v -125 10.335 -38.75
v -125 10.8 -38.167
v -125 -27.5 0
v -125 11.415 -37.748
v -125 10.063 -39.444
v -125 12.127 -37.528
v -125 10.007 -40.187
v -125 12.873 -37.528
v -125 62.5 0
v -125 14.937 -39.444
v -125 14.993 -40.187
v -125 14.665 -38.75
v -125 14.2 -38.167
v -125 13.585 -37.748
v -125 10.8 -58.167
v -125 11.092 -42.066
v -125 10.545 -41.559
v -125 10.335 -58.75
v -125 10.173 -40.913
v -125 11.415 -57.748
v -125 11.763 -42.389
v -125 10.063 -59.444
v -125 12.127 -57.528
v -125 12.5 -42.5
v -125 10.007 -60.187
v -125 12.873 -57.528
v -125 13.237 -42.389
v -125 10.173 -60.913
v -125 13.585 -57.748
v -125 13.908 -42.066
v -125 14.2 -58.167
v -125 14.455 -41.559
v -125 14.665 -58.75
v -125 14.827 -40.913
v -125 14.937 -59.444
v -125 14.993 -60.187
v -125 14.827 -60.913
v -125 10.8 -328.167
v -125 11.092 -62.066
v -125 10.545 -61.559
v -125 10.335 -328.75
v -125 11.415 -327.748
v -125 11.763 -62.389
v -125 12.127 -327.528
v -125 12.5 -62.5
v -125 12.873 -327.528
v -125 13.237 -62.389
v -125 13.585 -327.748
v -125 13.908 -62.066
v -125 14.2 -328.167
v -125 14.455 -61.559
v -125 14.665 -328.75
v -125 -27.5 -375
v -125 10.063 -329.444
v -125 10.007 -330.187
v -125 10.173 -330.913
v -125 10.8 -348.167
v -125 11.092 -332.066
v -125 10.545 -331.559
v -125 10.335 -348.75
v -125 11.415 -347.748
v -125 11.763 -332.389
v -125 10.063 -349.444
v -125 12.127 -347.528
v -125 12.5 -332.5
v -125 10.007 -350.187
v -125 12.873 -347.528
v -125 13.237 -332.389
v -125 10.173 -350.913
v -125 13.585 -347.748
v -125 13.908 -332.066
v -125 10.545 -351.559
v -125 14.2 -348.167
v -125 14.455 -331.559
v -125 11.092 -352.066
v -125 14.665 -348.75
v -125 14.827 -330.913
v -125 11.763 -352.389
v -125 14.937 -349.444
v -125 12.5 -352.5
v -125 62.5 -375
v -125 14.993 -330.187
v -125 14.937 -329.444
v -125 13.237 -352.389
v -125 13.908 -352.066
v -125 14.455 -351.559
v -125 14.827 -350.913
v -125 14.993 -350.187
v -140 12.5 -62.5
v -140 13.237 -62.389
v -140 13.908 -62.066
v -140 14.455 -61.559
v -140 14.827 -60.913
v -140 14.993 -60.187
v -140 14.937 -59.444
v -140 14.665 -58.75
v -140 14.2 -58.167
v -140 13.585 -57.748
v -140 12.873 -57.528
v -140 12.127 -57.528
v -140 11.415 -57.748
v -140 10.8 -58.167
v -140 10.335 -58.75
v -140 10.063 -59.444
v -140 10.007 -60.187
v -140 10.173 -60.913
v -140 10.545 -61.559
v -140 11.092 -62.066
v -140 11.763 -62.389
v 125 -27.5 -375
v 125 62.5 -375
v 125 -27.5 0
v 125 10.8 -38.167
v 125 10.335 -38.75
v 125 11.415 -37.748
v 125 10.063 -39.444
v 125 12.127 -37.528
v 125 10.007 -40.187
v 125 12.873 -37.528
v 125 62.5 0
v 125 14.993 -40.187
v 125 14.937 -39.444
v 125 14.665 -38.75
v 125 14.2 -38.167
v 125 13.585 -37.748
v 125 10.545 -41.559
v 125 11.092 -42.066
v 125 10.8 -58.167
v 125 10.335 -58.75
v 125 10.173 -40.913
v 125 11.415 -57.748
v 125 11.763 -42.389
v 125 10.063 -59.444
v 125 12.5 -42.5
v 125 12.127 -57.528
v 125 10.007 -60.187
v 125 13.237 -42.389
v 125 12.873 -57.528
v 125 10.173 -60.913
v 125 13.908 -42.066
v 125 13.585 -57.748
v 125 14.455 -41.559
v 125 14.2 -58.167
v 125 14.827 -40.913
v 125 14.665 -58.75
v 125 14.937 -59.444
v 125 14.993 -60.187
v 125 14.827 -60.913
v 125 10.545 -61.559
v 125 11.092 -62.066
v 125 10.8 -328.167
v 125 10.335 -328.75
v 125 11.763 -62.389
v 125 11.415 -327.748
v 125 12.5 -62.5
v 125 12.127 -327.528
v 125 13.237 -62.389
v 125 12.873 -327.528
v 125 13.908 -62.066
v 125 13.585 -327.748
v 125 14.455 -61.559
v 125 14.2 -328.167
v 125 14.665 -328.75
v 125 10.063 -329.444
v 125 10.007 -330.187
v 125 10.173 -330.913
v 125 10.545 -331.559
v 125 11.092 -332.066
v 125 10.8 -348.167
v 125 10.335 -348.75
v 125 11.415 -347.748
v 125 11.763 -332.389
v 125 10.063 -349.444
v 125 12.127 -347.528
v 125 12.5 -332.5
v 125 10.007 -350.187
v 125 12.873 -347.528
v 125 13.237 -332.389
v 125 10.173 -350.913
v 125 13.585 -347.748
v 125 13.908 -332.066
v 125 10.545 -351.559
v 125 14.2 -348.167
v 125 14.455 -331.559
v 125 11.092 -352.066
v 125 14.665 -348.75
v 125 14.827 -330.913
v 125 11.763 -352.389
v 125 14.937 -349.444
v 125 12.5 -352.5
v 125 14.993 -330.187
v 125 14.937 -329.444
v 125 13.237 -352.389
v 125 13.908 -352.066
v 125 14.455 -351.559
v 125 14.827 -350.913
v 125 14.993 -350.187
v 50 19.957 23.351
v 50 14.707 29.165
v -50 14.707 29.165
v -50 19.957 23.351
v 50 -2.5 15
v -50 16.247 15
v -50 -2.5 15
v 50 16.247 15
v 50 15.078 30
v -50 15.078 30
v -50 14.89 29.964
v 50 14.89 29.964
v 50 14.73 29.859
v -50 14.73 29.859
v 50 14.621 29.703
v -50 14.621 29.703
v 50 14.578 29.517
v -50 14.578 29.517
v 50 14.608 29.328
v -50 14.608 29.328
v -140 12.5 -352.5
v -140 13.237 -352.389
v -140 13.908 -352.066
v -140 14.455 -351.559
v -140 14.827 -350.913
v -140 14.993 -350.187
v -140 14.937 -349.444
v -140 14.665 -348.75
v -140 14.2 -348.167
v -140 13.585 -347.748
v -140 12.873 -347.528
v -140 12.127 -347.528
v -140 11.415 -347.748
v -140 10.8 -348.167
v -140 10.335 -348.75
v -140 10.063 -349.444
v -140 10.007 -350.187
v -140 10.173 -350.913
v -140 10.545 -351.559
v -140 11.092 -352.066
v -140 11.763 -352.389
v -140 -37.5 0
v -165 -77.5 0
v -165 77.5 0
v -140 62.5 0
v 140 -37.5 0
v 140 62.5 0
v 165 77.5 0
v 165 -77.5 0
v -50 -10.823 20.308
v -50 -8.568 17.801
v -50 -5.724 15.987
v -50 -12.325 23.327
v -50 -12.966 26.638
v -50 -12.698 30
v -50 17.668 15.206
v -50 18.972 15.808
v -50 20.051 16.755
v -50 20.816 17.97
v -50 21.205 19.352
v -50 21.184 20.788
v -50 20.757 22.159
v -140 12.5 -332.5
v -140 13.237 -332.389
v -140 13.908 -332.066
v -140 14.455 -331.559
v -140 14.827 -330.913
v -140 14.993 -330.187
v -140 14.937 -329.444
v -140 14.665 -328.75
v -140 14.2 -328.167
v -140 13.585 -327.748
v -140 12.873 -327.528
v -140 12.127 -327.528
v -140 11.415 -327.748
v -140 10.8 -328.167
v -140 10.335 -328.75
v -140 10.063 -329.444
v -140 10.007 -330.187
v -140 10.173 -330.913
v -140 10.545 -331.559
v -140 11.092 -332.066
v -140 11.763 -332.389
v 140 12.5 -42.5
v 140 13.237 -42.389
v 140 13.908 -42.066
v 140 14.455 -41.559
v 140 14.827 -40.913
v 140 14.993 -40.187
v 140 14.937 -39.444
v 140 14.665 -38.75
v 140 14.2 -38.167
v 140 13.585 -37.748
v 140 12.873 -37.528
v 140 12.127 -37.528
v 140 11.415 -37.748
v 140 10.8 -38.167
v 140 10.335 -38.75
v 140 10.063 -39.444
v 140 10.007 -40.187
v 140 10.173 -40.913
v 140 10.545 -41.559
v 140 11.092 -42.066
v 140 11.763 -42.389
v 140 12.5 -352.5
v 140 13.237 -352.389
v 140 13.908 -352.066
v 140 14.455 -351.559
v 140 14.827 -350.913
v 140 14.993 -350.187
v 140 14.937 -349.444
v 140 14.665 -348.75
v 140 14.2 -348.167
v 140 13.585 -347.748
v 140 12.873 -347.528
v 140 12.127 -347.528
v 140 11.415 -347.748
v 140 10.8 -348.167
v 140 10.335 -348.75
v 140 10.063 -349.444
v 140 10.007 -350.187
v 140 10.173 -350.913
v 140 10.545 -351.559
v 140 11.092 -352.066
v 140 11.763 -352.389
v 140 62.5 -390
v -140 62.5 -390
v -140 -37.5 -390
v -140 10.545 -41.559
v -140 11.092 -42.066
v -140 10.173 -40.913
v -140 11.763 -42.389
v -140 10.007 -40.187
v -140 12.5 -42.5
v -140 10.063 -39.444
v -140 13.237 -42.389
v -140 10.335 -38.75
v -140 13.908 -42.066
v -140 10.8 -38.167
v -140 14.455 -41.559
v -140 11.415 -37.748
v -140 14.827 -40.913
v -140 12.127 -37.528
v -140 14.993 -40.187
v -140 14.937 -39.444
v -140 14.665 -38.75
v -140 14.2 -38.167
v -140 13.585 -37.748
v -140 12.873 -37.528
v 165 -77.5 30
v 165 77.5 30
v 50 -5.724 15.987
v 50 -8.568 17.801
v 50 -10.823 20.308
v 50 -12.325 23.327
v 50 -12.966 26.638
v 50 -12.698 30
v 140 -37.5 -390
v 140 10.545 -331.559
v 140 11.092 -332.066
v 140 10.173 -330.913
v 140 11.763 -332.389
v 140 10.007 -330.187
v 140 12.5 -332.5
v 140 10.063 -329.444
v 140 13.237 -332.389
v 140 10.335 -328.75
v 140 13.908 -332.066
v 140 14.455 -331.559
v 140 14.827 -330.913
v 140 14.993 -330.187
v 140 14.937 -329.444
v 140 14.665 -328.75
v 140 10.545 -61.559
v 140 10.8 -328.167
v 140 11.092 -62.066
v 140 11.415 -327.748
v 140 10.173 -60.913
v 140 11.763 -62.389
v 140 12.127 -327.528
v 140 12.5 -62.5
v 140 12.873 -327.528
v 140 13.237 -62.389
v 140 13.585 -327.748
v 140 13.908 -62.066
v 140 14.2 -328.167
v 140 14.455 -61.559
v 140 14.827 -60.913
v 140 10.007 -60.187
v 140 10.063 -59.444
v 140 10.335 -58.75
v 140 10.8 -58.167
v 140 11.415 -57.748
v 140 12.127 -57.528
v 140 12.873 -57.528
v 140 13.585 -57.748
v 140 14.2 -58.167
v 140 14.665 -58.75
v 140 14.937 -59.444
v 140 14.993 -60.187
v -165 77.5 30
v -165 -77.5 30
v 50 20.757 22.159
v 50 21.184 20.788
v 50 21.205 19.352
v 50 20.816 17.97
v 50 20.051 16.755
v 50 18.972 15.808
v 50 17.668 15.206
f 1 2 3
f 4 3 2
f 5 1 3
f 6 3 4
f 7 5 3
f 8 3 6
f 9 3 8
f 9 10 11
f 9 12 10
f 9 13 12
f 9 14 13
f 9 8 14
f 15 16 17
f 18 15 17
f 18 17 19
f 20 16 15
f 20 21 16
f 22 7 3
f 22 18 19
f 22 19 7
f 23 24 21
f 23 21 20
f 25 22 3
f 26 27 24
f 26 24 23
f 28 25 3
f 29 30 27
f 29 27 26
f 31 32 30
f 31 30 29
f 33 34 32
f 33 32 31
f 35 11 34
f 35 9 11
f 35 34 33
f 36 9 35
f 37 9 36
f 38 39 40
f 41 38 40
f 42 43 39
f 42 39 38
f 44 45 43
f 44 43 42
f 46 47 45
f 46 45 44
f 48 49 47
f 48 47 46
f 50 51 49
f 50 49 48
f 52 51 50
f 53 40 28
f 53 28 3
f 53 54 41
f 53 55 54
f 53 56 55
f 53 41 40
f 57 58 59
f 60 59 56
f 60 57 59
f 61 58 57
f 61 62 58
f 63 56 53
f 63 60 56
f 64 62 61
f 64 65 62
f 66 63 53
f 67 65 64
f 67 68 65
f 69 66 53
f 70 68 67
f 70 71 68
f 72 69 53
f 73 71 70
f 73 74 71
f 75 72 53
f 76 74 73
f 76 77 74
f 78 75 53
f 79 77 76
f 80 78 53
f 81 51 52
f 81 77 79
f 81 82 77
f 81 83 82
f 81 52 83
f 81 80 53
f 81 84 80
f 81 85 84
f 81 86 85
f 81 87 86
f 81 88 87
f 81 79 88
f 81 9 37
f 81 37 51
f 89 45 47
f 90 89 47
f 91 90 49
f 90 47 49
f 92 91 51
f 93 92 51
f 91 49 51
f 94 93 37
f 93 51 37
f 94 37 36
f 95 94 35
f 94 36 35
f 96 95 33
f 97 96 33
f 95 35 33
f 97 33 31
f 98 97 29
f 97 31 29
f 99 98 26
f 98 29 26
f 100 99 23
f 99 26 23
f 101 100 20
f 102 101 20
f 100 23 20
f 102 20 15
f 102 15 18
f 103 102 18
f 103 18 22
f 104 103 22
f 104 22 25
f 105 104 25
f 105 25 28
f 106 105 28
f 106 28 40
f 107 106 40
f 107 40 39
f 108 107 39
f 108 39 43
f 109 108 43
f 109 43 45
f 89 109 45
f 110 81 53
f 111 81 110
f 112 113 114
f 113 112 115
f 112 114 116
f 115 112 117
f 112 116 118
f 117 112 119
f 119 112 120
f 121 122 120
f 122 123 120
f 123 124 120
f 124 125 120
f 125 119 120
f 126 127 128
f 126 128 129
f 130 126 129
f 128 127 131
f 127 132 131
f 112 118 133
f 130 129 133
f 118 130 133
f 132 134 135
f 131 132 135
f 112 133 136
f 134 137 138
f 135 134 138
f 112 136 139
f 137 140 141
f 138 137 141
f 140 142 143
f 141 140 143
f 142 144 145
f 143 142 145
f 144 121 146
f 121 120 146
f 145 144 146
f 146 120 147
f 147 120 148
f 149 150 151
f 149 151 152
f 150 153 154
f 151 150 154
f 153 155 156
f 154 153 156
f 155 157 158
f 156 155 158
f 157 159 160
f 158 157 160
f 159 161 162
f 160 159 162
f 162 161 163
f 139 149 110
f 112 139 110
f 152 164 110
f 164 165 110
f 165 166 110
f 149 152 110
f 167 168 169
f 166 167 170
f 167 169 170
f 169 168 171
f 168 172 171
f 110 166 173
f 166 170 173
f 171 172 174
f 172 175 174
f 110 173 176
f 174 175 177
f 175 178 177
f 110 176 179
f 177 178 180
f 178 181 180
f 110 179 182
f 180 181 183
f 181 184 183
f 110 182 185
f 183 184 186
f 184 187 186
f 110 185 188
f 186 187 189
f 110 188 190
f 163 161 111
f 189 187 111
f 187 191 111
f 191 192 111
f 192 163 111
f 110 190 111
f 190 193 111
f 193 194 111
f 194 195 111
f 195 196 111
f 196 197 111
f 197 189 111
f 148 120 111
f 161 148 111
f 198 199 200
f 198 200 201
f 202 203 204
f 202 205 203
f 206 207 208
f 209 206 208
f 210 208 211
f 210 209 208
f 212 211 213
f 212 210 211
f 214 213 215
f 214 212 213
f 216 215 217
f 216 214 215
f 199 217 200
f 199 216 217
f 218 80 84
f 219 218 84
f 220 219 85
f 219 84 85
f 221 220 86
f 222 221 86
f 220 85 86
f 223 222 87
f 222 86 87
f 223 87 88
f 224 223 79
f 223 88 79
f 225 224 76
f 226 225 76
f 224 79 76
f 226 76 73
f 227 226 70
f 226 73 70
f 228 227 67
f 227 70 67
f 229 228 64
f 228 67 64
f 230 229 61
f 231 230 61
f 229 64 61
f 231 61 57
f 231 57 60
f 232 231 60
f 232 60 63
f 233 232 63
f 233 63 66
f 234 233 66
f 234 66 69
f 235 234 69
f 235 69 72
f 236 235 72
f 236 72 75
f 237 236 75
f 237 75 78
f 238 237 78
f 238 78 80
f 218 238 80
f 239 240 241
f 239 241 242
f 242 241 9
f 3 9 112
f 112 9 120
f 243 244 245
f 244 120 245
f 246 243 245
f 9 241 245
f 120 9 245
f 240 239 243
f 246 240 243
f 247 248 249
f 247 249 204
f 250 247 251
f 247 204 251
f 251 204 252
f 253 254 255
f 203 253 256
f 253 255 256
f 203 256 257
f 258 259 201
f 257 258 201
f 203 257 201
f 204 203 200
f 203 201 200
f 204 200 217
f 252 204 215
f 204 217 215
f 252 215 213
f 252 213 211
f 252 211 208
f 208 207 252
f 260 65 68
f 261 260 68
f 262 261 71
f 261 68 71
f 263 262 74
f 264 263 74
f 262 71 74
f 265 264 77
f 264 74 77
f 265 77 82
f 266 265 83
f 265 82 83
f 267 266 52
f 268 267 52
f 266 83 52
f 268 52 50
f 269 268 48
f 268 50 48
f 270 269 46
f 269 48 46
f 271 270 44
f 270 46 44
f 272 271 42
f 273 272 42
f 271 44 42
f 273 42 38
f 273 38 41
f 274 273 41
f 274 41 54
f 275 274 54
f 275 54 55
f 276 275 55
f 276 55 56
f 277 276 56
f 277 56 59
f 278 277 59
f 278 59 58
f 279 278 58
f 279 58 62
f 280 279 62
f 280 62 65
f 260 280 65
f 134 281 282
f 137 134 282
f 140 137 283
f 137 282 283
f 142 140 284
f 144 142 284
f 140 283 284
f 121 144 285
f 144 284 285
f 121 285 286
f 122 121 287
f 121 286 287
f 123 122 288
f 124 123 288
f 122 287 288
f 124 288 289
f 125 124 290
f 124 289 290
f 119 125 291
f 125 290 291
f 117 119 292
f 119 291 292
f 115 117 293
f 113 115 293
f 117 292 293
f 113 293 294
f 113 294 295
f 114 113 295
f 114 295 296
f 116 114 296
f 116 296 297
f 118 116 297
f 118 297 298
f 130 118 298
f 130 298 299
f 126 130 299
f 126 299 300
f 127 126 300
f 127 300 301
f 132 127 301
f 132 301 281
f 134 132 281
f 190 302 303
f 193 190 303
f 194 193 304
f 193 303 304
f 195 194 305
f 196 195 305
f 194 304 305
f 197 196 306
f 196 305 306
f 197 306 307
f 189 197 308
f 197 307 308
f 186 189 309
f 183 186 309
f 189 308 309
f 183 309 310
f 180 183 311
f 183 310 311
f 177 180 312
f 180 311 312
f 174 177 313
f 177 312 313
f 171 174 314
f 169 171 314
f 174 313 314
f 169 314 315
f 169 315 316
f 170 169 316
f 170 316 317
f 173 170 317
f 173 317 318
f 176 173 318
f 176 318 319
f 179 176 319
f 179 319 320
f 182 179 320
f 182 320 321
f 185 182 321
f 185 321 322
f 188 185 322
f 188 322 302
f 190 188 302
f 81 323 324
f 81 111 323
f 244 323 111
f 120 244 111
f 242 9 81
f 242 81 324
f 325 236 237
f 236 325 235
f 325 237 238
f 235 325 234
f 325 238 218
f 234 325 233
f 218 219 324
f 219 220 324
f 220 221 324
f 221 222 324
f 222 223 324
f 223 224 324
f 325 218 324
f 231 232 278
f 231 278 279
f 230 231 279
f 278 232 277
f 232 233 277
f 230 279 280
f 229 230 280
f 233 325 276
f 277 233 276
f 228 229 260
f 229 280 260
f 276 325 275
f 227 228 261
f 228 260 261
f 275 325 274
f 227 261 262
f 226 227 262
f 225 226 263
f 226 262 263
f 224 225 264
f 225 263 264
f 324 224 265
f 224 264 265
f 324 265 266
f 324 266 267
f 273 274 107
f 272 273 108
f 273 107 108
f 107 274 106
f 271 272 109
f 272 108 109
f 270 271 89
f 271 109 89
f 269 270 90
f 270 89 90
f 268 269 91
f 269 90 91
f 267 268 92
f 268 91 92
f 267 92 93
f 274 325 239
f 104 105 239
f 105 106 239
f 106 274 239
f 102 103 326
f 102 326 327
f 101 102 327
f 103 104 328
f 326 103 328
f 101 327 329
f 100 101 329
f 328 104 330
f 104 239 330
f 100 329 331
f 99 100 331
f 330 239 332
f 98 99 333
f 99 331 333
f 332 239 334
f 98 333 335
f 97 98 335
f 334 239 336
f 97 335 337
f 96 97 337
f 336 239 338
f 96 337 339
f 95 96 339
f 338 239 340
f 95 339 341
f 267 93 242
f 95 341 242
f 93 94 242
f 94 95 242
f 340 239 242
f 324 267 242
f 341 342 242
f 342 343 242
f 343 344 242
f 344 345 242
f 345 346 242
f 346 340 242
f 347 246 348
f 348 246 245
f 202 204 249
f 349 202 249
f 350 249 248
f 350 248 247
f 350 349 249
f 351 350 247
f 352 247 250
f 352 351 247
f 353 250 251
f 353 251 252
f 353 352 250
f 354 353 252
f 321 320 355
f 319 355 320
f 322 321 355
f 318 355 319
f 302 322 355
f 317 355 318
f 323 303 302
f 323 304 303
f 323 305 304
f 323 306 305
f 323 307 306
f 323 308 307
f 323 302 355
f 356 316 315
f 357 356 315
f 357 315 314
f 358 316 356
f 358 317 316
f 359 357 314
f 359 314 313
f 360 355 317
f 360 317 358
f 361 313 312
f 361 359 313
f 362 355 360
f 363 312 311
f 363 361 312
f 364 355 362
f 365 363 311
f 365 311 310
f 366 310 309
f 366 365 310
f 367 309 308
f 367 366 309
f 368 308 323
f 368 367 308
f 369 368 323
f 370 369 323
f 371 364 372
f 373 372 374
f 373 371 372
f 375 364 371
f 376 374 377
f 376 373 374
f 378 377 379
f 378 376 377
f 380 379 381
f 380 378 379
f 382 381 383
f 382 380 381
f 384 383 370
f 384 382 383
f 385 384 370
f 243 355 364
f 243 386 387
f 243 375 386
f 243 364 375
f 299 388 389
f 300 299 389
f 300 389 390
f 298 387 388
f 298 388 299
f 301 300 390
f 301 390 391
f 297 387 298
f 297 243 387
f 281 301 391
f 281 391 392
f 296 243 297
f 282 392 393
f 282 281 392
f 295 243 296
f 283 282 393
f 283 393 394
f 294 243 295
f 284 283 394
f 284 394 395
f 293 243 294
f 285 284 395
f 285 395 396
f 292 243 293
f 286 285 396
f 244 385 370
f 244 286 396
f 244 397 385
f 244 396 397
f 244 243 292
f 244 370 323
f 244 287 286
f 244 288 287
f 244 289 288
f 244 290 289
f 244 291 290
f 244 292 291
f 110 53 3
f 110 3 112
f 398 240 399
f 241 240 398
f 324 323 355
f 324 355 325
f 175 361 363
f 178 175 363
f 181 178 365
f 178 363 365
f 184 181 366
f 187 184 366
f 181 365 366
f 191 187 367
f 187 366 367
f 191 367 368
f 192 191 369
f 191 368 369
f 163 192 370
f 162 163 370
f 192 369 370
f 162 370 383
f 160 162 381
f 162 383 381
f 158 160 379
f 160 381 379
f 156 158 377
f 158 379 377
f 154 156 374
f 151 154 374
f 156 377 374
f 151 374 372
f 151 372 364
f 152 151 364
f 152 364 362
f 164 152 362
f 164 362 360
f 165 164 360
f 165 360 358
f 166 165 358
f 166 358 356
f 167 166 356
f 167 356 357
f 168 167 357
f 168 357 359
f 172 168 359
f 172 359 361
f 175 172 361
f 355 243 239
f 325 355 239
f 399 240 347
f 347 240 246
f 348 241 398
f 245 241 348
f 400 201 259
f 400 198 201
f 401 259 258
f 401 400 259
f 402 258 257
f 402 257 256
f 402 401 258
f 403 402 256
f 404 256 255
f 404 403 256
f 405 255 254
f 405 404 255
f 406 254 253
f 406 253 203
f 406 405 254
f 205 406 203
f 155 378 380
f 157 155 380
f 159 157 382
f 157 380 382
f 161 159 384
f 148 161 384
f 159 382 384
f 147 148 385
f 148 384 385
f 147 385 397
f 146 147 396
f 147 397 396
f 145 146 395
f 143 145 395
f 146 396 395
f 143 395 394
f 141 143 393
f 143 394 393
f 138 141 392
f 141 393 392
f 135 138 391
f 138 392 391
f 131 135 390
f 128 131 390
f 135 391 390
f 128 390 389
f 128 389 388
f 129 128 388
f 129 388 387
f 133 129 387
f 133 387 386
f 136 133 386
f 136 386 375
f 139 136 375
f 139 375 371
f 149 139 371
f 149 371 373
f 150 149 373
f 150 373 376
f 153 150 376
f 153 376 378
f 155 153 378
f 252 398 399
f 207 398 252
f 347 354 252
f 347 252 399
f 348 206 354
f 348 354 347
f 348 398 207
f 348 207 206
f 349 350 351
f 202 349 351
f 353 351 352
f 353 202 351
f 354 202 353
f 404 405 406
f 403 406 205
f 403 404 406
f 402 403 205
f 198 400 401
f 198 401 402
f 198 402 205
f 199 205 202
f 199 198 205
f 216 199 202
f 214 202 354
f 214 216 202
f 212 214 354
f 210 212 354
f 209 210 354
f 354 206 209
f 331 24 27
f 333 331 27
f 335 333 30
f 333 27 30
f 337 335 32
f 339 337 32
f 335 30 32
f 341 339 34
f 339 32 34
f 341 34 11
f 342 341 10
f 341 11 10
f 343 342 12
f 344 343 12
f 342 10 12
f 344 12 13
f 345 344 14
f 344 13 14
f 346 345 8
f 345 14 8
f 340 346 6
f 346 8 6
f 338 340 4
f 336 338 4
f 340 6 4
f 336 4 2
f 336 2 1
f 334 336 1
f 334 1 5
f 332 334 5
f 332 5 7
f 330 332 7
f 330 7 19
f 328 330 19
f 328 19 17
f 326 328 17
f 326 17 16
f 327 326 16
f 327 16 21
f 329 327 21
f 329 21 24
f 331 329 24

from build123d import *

# Parameters (mm, degrees)
SKETCH1_W           = 330
SKETCH1_H           = 155
BOSS_EXTRUDE1_DEPTH = 30
SKETCH2_W           = 280
SKETCH2_H           = 100
BOSS_EXTRUDE2_DEPTH = 390
SKETCH3_W           = 250
SKETCH3_H           = 375
CUT_EXTRUDE1_DEPTH  = 90
CUT_EXTRUDE2_DEPTH  = 50
FILLET1_R           = 0.5
SKETCH7_R           = 2.5
CUT_EXTRUDE3_DEPTH  = 502.129973161


with BuildPart() as part:
    # Sketch1 → Boss-Extrude1 (new body)
    with BuildSketch(Plane.XY):
        Rectangle(SKETCH1_W, SKETCH1_H)
    extrude(amount=BOSS_EXTRUDE1_DEPTH)

    # Sketch2 → Boss-Extrude2 (add)
    with BuildSketch(Plane(origin=(0, 0, 0), x_dir=(-1, 0, 0), z_dir=(0, 0, -1))):
        with Locations((0, 12.5)):
            Rectangle(SKETCH2_W, SKETCH2_H)
    extrude(amount=BOSS_EXTRUDE2_DEPTH)

    # Sketch3 → Cut-Extrude1 (cut)
    with BuildSketch(Plane(origin=(0, 62.5, 0), x_dir=(1, 0, 0), z_dir=(0, 1, 0))):
        with Locations((0, 187.5)):
            Rectangle(SKETCH3_W, SKETCH3_H)
    extrude(amount=-CUT_EXTRUDE1_DEPTH, mode=Mode.SUBTRACT)

    # Sketch4 → Cut-Extrude2 (cut, symmetric)
    with BuildSketch(Plane(origin=(0, 0, 0), x_dir=(0, 0, -1), z_dir=(1, 0, 0))):
        with BuildLine():
            Line((-35.714873599, 8.791050276), (-23.35130712, 19.957391338))
            ThreePointArc((-23.35130712, 19.957391338), (-17.969795035, 20.816040293), (-15, 16.246765975))
            Line((-15, 16.246765975), (-15, -2.5))
            ThreePointArc((-15, -2.5), (-33.319001977, -11.460982872), (-35.714873599, 8.791050276))
        make_face()
    extrude(amount=CUT_EXTRUDE2_DEPTH, both=True, mode=Mode.SUBTRACT)

    # Fillet1
    fillet1_edges = [part.edges().sort_by_distance(p)[0] for p in [
        (0, 13.952524341, 30),
    ]]
    fillet(fillet1_edges, radius=FILLET1_R)

    # Sketch7 → Cut-Extrude3 (cut, through all)
    with BuildSketch(Plane(origin=(140, 0, 0), x_dir=(0, 0, -1), z_dir=(1, 0, 0))):
        with Locations((350, 12.5)):
            Circle(SKETCH7_R)
        with Locations((330, 12.5)):
            Circle(SKETCH7_R)
        with Locations((60, 12.5)):
            Circle(SKETCH7_R)
        with Locations((40, 12.5)):
            Circle(SKETCH7_R)
    extrude(amount=-CUT_EXTRUDE3_DEPTH, mode=Mode.SUBTRACT)


solid = part.part
